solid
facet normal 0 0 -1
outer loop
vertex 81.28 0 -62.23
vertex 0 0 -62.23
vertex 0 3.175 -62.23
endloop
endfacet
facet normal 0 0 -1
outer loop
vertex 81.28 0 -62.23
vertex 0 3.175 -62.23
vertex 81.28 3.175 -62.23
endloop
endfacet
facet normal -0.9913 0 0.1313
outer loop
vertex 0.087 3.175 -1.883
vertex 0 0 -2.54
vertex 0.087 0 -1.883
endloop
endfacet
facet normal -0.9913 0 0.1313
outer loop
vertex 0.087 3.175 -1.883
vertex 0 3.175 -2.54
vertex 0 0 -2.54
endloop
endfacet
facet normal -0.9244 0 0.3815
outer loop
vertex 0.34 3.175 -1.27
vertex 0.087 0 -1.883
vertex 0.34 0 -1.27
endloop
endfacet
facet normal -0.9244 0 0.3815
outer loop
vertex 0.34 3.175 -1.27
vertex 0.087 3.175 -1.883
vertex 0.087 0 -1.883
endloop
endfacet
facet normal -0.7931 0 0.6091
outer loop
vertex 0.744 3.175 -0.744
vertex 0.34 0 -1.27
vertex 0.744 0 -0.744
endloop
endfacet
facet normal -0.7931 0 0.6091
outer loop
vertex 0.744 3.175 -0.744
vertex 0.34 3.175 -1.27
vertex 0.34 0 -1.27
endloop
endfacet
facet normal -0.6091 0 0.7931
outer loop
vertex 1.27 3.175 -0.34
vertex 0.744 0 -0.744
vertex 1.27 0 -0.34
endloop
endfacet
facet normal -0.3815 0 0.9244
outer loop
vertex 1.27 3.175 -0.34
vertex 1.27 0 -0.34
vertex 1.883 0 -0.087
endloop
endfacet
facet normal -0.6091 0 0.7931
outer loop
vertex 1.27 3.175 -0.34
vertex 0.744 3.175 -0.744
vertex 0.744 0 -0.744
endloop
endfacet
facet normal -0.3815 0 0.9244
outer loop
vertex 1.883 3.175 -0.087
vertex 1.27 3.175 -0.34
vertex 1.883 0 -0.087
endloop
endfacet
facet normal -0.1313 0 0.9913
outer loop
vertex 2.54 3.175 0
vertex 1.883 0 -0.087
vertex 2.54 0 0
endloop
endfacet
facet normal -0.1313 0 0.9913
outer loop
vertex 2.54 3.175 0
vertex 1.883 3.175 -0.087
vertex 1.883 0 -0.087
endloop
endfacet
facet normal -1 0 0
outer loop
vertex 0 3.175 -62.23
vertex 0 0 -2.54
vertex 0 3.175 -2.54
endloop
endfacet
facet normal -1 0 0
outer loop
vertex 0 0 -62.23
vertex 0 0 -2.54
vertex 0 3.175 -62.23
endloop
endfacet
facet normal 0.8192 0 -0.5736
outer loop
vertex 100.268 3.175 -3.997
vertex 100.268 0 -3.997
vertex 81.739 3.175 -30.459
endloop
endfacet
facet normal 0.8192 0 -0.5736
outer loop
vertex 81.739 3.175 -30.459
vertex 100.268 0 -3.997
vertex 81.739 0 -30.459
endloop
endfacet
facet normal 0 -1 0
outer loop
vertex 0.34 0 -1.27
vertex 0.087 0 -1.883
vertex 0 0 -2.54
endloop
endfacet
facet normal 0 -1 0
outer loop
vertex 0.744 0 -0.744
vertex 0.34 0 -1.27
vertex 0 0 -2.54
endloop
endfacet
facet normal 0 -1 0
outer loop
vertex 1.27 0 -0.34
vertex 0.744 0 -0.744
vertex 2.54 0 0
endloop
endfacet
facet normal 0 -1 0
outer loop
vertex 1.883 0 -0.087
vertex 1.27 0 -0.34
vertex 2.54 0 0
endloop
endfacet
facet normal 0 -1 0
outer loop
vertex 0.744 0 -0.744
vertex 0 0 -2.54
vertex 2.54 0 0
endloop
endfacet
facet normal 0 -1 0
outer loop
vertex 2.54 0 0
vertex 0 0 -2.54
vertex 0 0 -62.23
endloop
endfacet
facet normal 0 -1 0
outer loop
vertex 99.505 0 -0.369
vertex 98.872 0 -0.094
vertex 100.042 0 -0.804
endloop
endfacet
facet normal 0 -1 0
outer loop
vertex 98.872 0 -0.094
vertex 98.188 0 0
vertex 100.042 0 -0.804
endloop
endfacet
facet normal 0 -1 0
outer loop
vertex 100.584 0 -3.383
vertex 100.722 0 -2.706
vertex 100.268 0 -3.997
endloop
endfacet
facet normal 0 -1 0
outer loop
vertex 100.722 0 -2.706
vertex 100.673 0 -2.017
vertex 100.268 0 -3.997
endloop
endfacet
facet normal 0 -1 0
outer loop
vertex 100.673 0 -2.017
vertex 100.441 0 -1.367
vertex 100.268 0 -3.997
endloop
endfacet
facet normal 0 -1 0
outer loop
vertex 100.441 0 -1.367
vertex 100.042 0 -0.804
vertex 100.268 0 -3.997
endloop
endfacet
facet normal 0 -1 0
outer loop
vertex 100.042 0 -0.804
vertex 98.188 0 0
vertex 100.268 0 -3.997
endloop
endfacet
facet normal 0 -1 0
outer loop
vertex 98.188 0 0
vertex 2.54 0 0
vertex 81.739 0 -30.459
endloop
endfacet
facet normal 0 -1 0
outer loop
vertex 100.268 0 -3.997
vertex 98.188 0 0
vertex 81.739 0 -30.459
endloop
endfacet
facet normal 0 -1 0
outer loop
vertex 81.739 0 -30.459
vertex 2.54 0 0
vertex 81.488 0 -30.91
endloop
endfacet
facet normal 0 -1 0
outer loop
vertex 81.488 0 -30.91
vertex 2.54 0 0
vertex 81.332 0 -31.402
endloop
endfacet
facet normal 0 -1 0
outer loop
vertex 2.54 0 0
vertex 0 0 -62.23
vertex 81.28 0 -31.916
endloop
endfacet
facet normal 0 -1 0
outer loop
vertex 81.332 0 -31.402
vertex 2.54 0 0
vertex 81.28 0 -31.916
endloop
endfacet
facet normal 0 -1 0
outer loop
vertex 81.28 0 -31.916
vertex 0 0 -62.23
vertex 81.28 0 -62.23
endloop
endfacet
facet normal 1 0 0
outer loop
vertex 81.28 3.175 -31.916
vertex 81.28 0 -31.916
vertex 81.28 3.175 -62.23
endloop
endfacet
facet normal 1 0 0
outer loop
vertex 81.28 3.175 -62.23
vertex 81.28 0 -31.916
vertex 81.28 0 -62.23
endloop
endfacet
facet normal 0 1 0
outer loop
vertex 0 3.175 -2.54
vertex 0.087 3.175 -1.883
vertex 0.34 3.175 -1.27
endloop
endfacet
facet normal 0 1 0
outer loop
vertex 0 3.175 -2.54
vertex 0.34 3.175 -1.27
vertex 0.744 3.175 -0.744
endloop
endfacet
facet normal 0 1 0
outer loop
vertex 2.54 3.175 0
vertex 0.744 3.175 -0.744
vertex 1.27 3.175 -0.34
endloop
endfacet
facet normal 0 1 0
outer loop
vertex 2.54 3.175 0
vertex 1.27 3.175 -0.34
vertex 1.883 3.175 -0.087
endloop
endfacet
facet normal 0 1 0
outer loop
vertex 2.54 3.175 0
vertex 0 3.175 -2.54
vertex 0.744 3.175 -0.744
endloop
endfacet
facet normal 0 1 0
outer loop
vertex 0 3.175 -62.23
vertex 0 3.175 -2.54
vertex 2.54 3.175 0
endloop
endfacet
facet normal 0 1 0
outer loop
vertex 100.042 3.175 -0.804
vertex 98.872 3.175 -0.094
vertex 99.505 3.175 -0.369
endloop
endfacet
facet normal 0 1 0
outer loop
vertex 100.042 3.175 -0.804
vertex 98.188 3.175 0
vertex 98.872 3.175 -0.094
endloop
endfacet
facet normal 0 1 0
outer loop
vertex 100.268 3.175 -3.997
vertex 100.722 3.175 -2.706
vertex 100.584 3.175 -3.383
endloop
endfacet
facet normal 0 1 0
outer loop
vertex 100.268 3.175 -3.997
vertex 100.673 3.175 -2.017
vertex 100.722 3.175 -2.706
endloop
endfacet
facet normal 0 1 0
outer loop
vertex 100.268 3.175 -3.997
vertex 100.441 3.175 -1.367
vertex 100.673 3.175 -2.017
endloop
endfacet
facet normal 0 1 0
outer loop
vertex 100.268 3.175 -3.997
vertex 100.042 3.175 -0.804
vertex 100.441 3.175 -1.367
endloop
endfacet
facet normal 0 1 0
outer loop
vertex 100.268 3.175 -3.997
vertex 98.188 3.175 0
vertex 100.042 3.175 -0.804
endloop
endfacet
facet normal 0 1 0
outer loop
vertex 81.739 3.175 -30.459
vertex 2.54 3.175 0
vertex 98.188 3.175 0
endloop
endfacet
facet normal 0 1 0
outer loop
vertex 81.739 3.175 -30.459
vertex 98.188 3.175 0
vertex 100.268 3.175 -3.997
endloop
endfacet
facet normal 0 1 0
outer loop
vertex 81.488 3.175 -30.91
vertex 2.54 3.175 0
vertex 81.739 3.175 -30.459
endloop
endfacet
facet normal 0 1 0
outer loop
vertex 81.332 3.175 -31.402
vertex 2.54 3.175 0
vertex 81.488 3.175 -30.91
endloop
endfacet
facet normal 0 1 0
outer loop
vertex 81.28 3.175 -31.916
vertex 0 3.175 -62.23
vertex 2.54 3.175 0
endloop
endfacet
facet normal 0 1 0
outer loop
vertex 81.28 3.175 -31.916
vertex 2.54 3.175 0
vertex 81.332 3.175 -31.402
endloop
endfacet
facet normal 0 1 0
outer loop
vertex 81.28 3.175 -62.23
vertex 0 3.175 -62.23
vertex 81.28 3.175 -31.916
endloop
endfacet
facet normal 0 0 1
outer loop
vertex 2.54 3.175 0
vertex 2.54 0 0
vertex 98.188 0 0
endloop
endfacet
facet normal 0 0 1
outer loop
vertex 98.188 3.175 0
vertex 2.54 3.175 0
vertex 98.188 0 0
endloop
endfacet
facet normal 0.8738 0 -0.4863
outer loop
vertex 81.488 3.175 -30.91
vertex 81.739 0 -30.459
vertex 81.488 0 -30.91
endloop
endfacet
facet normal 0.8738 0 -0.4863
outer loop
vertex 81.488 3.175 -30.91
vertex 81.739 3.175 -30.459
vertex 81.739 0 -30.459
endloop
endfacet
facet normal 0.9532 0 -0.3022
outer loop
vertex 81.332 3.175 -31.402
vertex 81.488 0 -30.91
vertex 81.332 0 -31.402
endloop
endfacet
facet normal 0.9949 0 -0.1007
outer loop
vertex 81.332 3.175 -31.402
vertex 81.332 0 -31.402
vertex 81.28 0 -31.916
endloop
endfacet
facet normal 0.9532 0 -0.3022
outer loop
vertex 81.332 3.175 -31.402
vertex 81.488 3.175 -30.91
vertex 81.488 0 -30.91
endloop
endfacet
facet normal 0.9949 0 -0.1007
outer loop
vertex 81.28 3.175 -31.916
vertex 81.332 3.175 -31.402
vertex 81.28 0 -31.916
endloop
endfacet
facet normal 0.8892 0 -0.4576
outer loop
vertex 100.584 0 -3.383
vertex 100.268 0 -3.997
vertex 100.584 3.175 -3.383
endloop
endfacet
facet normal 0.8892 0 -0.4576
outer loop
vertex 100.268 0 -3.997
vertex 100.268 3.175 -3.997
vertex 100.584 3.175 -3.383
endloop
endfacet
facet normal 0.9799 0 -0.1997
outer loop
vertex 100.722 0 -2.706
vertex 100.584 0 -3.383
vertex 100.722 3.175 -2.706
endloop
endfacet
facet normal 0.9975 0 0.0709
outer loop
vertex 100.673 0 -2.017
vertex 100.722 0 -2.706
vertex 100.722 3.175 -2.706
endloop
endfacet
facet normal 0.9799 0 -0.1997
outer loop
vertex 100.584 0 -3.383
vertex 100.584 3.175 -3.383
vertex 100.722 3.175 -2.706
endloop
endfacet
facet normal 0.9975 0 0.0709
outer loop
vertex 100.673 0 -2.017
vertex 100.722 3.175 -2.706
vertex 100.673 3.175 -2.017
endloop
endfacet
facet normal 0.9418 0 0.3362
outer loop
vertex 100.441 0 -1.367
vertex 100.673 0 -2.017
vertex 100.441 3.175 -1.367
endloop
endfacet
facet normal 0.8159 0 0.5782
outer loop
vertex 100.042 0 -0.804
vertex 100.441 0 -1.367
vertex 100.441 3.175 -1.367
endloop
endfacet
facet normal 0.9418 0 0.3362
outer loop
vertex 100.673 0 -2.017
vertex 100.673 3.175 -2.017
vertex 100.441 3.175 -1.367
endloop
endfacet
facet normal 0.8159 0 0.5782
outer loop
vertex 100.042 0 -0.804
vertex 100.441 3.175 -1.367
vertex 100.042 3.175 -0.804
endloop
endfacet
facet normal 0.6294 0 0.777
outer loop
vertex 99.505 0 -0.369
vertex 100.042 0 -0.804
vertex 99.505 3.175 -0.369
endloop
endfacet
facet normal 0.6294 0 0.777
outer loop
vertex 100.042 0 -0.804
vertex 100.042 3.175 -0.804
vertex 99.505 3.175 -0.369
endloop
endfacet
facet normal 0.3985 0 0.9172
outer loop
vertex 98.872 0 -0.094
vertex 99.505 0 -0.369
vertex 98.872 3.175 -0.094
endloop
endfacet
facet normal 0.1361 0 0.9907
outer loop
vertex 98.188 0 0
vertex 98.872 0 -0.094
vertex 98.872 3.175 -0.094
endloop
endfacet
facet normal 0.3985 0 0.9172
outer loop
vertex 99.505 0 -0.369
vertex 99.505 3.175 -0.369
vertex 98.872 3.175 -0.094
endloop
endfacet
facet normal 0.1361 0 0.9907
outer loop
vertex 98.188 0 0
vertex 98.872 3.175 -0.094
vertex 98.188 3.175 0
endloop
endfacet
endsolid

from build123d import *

# Parameters (mm, degrees)
SKETCH1_W           = 81.28
SKETCH1_H           = 62.23
BOSS_EXTRUDE1_DEPTH = 3.175
FILLET1_R           = 2.54


with BuildPart() as part:
    # Sketch1 → Boss-Extrude1 (new body)
    with BuildSketch(Plane(origin=(0, 0, 0), x_dir=(1, 0, 0), z_dir=(0, 1, 0))):
        Polygon((103.066957551, 0), (81.28, 31.115), (81.28, 0), align=None)
        with Locations((40.64, 31.115)):
            Rectangle(SKETCH1_W, SKETCH1_H)
    extrude(amount=BOSS_EXTRUDE1_DEPTH)

    # Fillet1
    fillet1_edges = [part.edges().sort_by_distance(p)[0] for p in [
        (0, 1.5875, 0),
        (81.28, 1.5875, -31.115),
        (103.066957551, 1.5875, 0),
    ]]
    fillet(fillet1_edges, radius=FILLET1_R)


solid = part.part
